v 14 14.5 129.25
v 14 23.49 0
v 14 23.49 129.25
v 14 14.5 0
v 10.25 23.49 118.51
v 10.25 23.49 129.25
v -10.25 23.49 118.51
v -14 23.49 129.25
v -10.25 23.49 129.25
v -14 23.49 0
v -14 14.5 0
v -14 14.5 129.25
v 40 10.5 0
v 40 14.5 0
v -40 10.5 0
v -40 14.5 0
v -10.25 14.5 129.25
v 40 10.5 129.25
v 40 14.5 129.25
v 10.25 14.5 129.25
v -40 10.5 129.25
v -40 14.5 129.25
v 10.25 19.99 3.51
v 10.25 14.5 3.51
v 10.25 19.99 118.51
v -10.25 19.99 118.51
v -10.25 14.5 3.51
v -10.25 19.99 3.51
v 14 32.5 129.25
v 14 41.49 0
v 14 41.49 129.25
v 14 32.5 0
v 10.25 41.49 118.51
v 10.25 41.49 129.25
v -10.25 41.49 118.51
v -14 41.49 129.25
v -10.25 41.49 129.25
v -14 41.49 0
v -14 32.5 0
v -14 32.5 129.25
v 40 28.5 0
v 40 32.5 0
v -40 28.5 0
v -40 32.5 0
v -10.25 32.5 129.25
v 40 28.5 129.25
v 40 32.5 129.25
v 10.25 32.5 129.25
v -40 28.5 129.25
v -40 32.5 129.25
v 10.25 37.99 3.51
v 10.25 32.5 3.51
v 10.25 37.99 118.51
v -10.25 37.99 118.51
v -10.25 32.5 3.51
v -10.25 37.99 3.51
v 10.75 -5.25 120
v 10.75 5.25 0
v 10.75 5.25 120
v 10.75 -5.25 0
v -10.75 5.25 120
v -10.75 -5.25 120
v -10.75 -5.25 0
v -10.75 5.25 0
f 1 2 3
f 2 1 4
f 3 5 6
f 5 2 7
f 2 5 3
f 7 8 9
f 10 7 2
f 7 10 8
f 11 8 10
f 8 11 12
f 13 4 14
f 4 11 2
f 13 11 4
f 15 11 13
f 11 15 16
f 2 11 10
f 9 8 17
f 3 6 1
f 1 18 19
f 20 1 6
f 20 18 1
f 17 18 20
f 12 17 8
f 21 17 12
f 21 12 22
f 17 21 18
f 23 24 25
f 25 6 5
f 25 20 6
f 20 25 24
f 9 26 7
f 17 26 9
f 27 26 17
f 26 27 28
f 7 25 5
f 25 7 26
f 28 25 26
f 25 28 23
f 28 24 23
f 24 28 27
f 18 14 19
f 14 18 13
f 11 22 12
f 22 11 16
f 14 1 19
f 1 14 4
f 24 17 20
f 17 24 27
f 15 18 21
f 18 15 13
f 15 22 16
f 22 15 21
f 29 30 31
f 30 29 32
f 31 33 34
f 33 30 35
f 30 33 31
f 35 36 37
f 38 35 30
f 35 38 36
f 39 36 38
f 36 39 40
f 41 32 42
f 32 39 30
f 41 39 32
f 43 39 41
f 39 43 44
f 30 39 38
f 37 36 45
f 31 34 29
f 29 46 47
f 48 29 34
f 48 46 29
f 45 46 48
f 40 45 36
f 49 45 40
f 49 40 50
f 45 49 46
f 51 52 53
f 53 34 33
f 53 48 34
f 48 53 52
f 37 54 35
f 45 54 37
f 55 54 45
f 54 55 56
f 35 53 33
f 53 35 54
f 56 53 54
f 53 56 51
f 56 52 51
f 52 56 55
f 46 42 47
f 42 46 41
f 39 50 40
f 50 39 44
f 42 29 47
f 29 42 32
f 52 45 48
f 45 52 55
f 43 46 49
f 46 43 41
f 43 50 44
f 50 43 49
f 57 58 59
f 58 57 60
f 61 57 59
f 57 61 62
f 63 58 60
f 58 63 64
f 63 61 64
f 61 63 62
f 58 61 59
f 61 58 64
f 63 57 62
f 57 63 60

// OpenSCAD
// file: monitor.scad
include <config.scad>;

module monitor_socket() {
    color([1, 1, 1, 0.6]) {
        difference() {
            // Block incl. walls
            wx_outer = monitor_socket_widthx + monitor_socket_thickness;
            wy_outer = monitor_socket_widthy + monitor_socket_thickness;
            translate([
                -wx_outer/2,
                -wy_outer/2,
                0
                ])
            cube([
                wx_outer,
                wy_outer,
                monitor_socket_height + monitor_socket_thickness
                ]);

            // Hole
            translate([
                -monitor_socket_widthx/2,
                -monitor_socket_widthx/2,
                -nothing
                ])
            cube([
                monitor_socket_widthx,
                monitor_socket_widthy,
                monitor_socket_height,
                ]);
        }
    }
}

monitor_socket();
// file: foot.scad
include <config.scad>;
use <monitor.scad>;


module angle() {
    color([0.5, 0.8, 0, 0.7]) {
        // Bottom half
        translate([
            -angle_width/2,
            0,
            0
            ])
        cube([
            angle_width,
            angle_lengthx,
            angle_thickness
            ]);

        // Upright half
        translate([
            -angle_width/2,
            0,
            0
            ])
        cube([
            angle_width,
            angle_thickness,
            angle_lengthy
            ]);
    }
}

module spacer() {
    color([0.5, 0.2, 0.7, 0.9])
    translate([
        -spacer_width/2,
        -spacer_thickness/2,
        0
        ])
    cube([
        spacer_width,
        spacer_thickness,
        spacer_height
        ]);
}

module foot() {
    color([0.1, 0.1, 0.8, 0.6]) {
        // Base plate
        translate([
            -foot_bottom_width/2,
            0,
            0
            ])
        cube([
            foot_bottom_width,
            foot_bottom_length,
            foot_bottom_height
            ]);

        // Angle encapsulator
        difference() {
            translate([
                -foot_anglecap_width/2,
                0,
                foot_bottom_height - nothing
                ])
            cube([
                foot_anglecap_width,
                foot_anglecap_length,
                foot_anglecap_height
                ]);

            // Insert angle here
            translate([
                - insertion_hole_width/2,
                - nothing,
                foot_bottom_height - nothing
                ])
            cube([
                insertion_hole_width,
                insertion_hole_length,
                foot_anglecap_height + nothing
                ]);

            // Pocket for the angle
            translate([
                - pocket_width/2,
                - nothing,
                foot_bottom_height - nothing
                ])
            cube([
                pocket_width,
                pocket_length,
                pocket_height
                ]);
        }
    }
}


for (a = [0:180:180]) {
    rotate(a) {
        translate([
            0,
            spacer_thickness/2 - nothing,
            foot_bottom_height + nothing
            ])
        angle();
        foot();
    }
}
translate([
    0,
    0,
    foot_bottom_height + nothing
    ])
spacer();
translate([0, 0, 35])
monitor_socket();
// file: config.scad
// Render options
$fn = 500;
nothing = 0.01;

// Monitor parameters
monitor_width = 0;
monitor_height = 0;
monitor_thickness = 0;
monitor_socket_widthx = 22;
monitor_socket_widthy = 21.5;
monitor_socket_height = 90;
monitor_socket_thickness = 1;

// Metal support
angle_lengthx = 120;
angle_lengthy = 120;
angle_width = 20;
angle_thickness = 5;

// Foot parameters
foot_bottom_height = 4;

// Spacer
spacer_width = monitor_socket_widthx - 0.5;
spacer_height = angle_lengthy;
spacer_thickness = monitor_socket_widthy - 2*angle_thickness - 2*0.5;

// More foot parameters
foot_anglecap_thickness = 4;
foot_anglecap_width = angle_width + 2*foot_anglecap_thickness;
foot_anglecap_height = angle_thickness + foot_anglecap_thickness;
foot_anglecap_length = spacer_thickness/2 + angle_lengthx + foot_anglecap_thickness;
foot_bottom_width = 80;
foot_bottom_length = foot_anglecap_thickness + angle_lengthx + spacer_thickness/2;
foot_height = foot_bottom_height + foot_anglecap_height;

// Where to insert the angle into the foot
insertion_hole_width = angle_width + 0.5;
insertion_hole_length = angle_thickness + spacer_thickness/2 + 0.5;
pocket_width = angle_width + 0.5;
pocket_height = angle_thickness + 0.5;
pocket_length = foot_bottom_length - foot_anglecap_thickness + 0.5;
// main file
include <config.scad>;
use <foot.scad>;


spacer();

translate([
    0,
    spacer_thickness,
    foot_bottom_length
    ])
rotate([-90, 0, 0])
foot();

translate([
    0,
    spacer_thickness + foot_height + 5,
    foot_bottom_length
    ])
rotate([-90, 0, 0])
foot();
